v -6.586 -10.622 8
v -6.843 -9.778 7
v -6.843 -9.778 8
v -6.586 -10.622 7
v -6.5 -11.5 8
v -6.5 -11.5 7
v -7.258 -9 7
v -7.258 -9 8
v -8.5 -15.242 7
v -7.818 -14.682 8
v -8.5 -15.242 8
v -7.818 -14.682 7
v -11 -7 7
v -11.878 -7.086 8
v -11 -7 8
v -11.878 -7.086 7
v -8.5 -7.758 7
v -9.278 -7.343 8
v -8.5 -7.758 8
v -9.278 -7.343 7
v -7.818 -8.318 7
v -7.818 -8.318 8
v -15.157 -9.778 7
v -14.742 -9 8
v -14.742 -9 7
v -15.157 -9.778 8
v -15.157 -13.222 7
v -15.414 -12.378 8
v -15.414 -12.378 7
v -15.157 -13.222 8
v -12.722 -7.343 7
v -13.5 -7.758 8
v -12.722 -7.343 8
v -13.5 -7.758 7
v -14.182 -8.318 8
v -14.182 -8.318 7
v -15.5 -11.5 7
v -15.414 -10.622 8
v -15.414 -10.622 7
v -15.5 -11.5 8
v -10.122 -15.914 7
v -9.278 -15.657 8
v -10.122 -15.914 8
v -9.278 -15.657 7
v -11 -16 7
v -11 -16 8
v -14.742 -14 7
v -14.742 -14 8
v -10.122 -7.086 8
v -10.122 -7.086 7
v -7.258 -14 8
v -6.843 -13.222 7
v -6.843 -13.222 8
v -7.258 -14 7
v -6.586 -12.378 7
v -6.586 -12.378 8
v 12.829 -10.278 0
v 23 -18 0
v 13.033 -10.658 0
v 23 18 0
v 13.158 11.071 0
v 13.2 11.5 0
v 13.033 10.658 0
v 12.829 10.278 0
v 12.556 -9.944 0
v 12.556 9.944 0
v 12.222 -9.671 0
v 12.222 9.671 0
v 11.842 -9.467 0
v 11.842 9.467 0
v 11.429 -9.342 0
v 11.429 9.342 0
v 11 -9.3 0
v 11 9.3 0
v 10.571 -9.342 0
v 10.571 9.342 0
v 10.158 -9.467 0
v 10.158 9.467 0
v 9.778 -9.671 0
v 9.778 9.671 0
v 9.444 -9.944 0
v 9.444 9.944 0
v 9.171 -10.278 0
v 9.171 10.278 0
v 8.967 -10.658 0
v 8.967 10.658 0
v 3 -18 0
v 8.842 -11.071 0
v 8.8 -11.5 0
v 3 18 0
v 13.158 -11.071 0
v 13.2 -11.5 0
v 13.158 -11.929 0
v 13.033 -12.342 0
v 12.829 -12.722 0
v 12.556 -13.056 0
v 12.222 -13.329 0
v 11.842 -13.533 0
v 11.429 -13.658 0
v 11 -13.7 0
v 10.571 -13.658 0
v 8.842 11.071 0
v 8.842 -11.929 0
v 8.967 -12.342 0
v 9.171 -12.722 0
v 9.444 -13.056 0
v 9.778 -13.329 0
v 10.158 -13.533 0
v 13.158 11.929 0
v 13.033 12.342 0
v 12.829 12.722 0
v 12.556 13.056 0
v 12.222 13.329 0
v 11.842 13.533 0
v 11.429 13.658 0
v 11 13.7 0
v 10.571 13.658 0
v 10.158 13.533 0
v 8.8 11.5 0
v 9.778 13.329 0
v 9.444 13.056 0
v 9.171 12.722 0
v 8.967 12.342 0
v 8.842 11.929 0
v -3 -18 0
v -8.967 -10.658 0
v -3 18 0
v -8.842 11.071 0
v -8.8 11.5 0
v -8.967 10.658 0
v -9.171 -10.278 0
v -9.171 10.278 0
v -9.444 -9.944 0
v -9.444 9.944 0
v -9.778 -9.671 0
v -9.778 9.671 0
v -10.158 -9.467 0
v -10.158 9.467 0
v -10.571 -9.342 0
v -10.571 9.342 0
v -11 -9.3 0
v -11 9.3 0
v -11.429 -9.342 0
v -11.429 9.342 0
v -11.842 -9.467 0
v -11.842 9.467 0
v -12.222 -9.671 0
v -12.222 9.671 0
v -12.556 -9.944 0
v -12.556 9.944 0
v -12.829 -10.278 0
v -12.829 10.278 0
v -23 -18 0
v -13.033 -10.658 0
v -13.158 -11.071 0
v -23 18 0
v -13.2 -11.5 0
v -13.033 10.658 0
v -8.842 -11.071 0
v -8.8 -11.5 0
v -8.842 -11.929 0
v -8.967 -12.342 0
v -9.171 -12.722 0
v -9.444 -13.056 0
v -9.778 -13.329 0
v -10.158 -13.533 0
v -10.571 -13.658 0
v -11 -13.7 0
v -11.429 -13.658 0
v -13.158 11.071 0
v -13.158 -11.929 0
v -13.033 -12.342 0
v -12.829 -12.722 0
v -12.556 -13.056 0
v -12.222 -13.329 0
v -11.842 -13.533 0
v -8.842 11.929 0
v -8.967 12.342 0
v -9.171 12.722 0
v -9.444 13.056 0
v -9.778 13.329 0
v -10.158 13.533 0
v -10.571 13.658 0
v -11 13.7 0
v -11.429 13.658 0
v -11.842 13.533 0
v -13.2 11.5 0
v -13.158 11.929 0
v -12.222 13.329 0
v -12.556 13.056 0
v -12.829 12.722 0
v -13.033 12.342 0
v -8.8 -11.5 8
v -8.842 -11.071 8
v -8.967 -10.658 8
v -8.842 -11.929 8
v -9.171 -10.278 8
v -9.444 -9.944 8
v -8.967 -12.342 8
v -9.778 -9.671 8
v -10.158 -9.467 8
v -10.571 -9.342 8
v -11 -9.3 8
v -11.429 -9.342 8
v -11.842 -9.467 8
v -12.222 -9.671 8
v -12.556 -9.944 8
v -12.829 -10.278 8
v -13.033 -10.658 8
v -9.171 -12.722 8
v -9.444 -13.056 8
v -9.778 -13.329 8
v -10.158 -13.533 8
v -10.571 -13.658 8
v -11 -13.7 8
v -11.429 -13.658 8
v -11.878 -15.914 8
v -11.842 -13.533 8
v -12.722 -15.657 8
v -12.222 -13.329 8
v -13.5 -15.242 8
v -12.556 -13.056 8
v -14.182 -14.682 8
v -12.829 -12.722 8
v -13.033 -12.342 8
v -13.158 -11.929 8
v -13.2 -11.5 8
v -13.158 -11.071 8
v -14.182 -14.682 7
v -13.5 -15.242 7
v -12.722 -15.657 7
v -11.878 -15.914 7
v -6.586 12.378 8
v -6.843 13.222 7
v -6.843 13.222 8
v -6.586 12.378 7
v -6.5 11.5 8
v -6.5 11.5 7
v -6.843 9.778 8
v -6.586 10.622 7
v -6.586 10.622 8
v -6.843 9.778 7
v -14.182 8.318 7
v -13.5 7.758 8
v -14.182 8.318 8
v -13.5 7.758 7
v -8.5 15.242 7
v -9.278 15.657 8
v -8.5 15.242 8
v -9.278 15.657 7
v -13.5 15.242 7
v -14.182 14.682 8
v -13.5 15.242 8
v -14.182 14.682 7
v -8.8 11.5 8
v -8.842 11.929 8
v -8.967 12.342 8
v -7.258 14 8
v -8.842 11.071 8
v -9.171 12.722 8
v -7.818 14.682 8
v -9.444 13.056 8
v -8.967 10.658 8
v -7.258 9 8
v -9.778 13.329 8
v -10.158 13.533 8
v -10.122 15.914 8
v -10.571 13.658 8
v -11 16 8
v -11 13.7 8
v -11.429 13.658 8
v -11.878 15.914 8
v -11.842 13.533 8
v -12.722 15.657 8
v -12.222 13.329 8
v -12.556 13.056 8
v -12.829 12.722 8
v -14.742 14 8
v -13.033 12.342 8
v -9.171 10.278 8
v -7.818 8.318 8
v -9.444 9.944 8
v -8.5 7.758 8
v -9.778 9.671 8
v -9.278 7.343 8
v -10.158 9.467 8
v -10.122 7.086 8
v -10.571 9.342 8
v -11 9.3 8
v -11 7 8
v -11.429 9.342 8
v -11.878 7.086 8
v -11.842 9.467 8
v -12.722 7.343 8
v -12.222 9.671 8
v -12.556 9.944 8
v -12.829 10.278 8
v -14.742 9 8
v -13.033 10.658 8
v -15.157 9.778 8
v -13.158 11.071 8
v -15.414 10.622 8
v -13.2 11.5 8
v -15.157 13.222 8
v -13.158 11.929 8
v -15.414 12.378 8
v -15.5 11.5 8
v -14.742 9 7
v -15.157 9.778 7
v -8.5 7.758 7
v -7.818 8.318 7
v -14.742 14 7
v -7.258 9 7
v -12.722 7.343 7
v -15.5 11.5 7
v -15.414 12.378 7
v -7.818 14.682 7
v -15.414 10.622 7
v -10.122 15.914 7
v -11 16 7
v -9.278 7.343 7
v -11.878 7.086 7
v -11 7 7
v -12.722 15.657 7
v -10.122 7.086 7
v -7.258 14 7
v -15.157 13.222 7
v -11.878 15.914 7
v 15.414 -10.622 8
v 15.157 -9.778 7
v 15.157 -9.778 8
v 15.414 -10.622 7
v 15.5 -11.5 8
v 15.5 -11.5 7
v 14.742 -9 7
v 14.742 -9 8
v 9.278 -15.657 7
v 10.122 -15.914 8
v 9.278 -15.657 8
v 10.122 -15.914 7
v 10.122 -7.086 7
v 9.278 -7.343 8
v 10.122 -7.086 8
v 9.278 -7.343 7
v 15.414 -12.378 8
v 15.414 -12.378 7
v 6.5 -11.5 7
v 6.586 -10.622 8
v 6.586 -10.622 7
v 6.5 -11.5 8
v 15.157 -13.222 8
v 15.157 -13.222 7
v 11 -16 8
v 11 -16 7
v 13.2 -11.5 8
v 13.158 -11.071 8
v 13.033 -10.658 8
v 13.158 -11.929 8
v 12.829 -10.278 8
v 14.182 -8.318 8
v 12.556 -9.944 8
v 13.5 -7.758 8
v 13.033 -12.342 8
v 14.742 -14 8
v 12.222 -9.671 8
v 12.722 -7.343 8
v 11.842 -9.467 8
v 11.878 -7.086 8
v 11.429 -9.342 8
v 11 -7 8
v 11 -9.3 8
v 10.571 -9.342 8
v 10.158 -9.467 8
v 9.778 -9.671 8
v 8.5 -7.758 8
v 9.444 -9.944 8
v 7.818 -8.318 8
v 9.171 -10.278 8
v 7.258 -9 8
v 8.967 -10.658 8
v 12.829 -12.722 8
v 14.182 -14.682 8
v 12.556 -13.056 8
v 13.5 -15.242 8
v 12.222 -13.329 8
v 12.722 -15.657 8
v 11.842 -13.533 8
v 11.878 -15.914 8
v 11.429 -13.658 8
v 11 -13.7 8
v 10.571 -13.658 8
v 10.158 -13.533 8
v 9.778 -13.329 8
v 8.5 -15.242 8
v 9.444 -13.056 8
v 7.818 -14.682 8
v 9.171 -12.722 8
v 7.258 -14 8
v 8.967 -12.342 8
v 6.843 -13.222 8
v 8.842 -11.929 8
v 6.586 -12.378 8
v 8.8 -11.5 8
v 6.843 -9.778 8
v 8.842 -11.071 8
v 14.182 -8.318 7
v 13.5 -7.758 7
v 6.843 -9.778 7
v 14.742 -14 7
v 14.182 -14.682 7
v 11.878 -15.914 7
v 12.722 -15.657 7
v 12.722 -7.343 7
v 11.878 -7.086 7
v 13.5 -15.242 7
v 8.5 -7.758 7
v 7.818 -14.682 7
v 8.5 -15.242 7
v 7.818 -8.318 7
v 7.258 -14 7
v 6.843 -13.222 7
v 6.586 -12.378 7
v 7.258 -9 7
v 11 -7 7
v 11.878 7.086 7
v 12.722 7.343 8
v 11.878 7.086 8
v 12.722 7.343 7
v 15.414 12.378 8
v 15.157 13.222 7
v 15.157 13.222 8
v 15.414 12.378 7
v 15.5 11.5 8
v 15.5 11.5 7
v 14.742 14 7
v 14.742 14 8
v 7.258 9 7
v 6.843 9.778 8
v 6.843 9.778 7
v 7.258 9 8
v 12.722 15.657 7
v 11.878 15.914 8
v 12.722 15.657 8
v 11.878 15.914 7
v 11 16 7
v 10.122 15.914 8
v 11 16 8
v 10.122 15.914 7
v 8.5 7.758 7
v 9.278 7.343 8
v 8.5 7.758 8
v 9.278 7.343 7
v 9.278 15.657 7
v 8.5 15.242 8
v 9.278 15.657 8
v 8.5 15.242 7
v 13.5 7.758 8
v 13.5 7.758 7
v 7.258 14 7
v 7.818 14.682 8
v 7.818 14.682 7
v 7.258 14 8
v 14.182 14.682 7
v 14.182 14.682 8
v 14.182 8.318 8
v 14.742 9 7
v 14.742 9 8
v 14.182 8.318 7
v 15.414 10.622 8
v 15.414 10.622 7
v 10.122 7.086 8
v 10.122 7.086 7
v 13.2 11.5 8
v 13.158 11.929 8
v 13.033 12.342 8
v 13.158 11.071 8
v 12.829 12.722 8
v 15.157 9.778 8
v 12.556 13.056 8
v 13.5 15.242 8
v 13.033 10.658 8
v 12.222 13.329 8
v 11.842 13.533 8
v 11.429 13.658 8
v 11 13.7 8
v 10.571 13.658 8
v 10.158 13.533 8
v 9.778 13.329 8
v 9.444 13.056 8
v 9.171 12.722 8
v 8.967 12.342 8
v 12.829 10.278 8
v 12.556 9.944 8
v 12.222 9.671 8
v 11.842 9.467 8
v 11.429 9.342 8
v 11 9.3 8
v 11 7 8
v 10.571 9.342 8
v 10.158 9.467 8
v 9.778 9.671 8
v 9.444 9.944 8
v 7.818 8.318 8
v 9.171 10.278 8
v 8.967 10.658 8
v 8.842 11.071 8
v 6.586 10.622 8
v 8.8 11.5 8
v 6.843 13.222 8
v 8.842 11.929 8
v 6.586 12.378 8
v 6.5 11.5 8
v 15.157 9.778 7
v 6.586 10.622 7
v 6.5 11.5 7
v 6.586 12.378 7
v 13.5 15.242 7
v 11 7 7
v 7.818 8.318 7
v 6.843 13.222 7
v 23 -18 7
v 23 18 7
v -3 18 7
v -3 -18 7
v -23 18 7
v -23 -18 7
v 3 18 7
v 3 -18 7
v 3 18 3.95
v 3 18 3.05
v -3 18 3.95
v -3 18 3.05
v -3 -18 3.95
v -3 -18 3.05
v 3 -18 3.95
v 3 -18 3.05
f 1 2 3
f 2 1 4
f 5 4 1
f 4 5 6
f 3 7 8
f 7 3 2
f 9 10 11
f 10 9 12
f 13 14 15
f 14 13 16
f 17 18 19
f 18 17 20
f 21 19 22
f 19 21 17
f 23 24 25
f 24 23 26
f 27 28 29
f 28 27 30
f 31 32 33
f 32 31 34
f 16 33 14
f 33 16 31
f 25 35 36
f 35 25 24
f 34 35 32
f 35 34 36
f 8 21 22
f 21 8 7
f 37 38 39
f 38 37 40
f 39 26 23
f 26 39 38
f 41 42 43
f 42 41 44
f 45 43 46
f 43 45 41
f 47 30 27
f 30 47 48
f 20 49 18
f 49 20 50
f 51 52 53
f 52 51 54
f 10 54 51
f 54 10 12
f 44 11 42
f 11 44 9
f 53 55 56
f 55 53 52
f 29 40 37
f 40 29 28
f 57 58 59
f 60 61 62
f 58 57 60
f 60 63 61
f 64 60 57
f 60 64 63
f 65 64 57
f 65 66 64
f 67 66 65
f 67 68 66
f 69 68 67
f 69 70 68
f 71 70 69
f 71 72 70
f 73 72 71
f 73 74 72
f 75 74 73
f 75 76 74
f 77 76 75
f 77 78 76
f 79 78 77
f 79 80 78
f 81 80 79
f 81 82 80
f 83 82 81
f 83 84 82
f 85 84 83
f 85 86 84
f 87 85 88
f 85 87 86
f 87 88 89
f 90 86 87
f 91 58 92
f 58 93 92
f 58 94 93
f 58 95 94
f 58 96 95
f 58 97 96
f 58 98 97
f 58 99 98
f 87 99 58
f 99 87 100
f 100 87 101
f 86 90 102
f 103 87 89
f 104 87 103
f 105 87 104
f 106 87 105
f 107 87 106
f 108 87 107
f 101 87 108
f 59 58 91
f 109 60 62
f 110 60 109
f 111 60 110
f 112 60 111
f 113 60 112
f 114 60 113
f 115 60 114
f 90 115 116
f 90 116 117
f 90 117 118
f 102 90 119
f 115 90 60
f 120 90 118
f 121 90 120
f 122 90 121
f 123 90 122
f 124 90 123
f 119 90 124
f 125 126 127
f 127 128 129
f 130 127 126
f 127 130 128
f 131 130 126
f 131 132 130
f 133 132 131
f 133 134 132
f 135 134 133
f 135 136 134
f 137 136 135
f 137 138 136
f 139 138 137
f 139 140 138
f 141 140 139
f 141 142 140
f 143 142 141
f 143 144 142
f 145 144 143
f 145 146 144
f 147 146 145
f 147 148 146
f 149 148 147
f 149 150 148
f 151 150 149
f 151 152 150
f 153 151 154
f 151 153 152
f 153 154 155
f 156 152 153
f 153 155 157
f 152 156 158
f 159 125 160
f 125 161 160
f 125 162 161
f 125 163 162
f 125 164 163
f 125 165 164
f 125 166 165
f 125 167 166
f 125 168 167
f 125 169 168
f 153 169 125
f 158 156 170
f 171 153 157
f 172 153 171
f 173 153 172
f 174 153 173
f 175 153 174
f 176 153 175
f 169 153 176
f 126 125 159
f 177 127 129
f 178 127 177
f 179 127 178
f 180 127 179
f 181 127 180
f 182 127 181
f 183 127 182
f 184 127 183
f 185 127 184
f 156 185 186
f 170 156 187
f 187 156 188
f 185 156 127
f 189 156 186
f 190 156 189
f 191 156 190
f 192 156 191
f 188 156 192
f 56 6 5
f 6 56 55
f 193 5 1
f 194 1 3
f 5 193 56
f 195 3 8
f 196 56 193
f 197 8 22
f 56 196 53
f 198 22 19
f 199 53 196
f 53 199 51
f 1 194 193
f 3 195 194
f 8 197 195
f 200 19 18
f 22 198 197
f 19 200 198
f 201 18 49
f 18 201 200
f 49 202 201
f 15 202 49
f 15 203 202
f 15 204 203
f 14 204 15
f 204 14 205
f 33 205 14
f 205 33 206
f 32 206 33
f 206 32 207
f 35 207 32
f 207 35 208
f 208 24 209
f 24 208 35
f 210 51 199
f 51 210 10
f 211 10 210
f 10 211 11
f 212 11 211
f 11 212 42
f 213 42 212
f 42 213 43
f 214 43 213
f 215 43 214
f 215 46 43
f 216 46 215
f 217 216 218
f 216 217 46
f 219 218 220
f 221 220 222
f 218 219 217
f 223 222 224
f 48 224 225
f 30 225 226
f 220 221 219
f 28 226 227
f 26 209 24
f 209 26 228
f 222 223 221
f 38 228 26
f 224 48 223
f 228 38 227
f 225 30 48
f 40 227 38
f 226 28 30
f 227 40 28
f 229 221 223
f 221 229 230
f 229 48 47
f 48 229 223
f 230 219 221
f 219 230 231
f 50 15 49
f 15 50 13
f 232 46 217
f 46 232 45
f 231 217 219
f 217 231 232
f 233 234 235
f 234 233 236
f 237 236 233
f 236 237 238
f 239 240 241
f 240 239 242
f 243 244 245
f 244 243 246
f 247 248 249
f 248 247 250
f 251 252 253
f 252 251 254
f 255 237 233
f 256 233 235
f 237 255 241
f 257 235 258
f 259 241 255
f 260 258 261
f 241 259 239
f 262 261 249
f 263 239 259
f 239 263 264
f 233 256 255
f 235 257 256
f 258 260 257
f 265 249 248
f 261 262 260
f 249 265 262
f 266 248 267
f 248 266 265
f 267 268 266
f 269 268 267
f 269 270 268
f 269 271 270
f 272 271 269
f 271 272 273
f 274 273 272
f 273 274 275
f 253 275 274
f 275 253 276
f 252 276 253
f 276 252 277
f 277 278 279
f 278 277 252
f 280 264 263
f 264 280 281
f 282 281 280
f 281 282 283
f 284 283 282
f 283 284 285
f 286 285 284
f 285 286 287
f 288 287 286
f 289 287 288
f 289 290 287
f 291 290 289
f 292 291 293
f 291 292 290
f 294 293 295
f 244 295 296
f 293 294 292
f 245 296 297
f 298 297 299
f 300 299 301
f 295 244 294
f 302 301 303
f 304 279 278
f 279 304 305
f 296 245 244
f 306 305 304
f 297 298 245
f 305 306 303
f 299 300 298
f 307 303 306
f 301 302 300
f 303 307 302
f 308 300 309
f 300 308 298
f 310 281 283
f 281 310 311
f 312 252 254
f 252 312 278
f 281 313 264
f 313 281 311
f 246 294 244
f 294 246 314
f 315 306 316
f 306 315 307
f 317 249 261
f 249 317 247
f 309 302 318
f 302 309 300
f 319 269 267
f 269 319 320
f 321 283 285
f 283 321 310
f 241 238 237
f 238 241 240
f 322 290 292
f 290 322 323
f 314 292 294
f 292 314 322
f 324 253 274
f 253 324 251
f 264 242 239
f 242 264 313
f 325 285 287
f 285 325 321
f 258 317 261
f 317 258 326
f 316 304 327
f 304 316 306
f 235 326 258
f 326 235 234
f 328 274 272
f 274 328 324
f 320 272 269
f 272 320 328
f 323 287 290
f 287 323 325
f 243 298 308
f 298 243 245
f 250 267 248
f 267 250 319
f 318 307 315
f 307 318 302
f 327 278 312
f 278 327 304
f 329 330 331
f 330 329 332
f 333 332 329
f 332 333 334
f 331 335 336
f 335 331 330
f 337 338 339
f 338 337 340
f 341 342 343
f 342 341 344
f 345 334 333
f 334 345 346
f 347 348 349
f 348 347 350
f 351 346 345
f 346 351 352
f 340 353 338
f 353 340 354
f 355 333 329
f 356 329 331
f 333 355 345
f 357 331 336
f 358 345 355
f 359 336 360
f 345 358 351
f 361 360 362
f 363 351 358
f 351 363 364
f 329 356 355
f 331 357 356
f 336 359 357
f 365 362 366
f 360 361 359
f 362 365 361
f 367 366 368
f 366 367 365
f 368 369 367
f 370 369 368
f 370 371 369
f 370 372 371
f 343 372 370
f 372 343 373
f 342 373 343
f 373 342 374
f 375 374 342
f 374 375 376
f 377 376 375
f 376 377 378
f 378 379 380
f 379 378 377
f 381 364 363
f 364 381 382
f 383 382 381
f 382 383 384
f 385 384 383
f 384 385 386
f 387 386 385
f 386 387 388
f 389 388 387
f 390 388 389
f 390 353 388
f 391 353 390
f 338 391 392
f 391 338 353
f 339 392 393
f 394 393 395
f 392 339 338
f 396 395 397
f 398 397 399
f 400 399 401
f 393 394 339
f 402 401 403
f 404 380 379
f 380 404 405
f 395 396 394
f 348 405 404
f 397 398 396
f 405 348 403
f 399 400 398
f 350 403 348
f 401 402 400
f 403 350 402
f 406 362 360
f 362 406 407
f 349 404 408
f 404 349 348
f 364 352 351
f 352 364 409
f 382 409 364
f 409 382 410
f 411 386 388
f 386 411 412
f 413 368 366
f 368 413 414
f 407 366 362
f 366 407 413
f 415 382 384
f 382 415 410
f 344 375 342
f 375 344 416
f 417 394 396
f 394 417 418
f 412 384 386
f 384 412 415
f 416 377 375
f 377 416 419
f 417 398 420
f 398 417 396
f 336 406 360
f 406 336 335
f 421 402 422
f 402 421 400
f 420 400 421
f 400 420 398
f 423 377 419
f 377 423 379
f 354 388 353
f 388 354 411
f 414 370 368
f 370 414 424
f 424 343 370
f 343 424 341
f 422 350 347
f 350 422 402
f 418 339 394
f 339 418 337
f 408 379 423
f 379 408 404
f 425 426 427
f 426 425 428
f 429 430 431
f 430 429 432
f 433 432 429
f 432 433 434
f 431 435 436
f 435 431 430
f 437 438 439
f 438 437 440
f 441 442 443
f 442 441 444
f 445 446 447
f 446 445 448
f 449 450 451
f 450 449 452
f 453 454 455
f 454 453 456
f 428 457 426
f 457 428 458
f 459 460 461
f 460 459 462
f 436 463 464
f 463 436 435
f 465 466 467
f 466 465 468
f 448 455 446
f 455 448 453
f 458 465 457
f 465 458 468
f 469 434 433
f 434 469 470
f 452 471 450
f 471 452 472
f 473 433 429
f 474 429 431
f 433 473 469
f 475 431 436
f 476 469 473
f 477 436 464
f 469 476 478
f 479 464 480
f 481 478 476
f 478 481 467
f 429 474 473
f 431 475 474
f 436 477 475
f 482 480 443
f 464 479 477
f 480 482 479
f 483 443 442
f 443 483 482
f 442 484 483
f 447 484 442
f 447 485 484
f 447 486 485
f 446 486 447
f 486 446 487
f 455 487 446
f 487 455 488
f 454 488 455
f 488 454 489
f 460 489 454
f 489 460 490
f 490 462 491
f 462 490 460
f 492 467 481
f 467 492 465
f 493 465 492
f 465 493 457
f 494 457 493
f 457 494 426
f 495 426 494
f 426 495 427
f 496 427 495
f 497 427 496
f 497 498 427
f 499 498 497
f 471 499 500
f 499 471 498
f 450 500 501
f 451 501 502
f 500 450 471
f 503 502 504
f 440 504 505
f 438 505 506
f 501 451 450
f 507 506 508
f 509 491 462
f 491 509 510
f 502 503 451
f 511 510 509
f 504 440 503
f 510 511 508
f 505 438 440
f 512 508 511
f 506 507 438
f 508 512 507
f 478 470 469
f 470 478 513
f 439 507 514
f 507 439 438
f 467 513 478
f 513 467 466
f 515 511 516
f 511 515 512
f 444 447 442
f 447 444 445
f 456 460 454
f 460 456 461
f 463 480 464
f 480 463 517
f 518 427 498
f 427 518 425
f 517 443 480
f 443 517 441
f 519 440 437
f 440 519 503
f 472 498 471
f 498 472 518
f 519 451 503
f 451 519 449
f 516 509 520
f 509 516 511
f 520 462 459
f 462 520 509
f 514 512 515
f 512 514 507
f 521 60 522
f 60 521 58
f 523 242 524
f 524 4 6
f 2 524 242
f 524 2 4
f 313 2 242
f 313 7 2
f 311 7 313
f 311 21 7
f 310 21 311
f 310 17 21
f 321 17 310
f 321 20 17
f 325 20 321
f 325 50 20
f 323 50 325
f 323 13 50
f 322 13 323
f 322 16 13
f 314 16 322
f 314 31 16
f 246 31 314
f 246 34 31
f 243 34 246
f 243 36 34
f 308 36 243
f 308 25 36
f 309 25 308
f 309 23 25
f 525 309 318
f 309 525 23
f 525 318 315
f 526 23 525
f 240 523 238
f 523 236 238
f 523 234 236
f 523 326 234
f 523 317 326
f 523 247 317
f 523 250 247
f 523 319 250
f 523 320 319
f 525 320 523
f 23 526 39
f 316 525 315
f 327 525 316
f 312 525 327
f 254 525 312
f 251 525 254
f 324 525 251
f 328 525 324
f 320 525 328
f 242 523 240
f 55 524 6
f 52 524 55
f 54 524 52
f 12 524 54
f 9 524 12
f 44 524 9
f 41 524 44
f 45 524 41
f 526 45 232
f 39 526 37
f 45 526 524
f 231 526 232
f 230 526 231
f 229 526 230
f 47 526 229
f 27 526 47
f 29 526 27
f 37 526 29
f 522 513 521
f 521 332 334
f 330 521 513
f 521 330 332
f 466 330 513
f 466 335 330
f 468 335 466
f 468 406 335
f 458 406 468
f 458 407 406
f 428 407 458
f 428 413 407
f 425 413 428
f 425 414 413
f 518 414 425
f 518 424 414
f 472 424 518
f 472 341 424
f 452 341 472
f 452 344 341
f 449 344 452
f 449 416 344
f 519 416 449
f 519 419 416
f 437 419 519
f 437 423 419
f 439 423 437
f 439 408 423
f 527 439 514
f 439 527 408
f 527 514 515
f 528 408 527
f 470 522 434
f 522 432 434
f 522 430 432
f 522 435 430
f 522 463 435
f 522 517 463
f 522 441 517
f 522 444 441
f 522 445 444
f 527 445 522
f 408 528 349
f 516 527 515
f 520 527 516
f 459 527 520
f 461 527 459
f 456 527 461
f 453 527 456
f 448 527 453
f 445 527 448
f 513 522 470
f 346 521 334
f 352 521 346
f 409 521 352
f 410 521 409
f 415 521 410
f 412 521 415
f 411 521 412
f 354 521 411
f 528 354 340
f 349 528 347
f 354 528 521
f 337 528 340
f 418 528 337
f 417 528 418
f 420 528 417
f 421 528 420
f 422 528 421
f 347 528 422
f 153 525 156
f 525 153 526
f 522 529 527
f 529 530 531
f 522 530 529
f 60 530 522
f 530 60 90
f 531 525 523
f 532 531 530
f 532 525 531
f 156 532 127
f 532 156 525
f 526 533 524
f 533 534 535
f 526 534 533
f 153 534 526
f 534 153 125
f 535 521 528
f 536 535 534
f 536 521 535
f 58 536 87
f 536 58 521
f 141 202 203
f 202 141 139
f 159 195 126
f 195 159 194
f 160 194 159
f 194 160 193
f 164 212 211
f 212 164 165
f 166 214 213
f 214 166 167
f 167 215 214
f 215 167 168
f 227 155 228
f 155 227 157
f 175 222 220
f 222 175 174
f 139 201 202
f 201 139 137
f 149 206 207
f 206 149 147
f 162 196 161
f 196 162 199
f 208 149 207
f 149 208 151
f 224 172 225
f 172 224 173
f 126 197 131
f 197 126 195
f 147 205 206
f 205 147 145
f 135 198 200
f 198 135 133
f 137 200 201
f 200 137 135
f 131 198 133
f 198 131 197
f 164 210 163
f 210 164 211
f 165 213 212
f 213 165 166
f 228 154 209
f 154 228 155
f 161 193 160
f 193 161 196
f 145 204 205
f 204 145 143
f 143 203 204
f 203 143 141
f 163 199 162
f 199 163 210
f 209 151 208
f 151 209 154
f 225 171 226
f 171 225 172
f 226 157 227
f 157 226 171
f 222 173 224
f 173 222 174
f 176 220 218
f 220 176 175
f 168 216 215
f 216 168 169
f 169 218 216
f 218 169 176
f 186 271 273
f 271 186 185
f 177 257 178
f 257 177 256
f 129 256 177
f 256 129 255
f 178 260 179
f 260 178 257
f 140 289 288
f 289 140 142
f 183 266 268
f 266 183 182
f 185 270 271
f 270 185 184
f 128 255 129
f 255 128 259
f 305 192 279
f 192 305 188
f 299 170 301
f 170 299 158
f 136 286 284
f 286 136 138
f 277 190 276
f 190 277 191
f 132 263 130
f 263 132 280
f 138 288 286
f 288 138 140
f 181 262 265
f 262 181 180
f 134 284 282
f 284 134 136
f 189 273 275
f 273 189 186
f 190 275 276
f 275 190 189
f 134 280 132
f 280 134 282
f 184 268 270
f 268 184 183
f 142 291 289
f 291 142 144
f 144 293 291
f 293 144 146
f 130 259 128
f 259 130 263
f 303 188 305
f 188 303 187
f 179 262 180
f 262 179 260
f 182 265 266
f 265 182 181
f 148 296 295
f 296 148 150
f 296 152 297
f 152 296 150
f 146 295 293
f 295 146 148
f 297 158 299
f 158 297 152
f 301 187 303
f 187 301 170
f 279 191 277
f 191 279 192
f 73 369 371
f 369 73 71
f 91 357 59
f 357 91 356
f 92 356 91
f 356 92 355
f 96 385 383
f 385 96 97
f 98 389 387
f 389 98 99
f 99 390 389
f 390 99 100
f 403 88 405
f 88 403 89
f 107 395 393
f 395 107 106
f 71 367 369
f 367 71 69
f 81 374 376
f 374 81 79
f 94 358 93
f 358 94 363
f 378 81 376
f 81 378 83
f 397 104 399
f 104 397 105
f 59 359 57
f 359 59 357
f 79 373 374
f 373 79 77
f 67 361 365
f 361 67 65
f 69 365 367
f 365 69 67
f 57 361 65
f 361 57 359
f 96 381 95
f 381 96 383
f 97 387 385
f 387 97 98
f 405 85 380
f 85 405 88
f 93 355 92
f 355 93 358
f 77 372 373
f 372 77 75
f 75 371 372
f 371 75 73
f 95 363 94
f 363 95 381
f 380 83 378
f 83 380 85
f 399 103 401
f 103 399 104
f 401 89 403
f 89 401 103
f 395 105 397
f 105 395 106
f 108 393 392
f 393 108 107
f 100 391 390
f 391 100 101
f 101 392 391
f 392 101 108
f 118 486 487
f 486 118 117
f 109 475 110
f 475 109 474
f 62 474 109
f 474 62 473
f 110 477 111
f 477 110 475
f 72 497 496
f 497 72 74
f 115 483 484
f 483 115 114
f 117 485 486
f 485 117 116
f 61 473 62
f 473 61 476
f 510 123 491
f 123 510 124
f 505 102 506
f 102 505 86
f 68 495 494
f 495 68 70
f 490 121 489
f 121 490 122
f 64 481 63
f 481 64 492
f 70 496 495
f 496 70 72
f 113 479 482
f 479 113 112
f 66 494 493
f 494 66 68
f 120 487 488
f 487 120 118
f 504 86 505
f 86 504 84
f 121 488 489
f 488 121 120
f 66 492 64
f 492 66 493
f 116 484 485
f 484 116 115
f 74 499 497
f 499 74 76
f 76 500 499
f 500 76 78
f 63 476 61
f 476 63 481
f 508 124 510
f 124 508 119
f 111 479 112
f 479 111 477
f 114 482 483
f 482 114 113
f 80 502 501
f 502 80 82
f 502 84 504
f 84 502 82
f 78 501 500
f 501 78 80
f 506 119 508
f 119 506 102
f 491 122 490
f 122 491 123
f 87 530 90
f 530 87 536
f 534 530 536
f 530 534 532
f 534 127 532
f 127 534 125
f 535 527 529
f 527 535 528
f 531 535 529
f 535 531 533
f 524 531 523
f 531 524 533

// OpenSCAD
$fn = 32;

// ----------------------------------------------------------------------
// Living hinge: 46 x 36 mm plates, 0.9 mm flexible web
// ----------------------------------------------------------------------

// --- parameters (mm) ---
plate_len = 20;           // plate length outside the web
plate_w = 36;             // plate width
thick = 7;                // plate thickness
web_half = 3;             // half width of the flex band
web_t = 0.9;              // flexible web thickness
web_z = 3.05;             // web position inside the thickness
boss_d = 9;               // screw boss diameter
boss_h = 8;               // screw boss height
boss_x = 11;              // screw boss distance from the web
screw_d = 4.4;            // screw hole

difference() {
  union() {
    /* one flat strip, later thinned at the middle */
    translate([-23, -18, 0]) cube([46, 36, 7]);
    /* screw bosses, sunk 0.5 mm into the plates */
    for (sx = [-11, 11]) {
      for (sy = [-11.5, 11.5]) {
        translate([sx, sy, 0]) cylinder(h = boss_h, d = boss_d);
      }
    }
  }
  /* channel from below: leaves the web on top of it */
  translate([-3, -20.5, -2.5]) cube([6, 41, 5.55]);
  /* channel from above: thins the web down to web_t */
  translate([-3, -20.5, 3.95]) cube([6, 41, 5.55]);
  /* screw holes through the bosses */
  for (sx = [-11, 11]) {
    for (sy = [-11.5, 11.5]) {
      translate([sx, sy, -2.5]) cylinder(h = boss_h + 5, d = screw_d);
    }
  }
}
